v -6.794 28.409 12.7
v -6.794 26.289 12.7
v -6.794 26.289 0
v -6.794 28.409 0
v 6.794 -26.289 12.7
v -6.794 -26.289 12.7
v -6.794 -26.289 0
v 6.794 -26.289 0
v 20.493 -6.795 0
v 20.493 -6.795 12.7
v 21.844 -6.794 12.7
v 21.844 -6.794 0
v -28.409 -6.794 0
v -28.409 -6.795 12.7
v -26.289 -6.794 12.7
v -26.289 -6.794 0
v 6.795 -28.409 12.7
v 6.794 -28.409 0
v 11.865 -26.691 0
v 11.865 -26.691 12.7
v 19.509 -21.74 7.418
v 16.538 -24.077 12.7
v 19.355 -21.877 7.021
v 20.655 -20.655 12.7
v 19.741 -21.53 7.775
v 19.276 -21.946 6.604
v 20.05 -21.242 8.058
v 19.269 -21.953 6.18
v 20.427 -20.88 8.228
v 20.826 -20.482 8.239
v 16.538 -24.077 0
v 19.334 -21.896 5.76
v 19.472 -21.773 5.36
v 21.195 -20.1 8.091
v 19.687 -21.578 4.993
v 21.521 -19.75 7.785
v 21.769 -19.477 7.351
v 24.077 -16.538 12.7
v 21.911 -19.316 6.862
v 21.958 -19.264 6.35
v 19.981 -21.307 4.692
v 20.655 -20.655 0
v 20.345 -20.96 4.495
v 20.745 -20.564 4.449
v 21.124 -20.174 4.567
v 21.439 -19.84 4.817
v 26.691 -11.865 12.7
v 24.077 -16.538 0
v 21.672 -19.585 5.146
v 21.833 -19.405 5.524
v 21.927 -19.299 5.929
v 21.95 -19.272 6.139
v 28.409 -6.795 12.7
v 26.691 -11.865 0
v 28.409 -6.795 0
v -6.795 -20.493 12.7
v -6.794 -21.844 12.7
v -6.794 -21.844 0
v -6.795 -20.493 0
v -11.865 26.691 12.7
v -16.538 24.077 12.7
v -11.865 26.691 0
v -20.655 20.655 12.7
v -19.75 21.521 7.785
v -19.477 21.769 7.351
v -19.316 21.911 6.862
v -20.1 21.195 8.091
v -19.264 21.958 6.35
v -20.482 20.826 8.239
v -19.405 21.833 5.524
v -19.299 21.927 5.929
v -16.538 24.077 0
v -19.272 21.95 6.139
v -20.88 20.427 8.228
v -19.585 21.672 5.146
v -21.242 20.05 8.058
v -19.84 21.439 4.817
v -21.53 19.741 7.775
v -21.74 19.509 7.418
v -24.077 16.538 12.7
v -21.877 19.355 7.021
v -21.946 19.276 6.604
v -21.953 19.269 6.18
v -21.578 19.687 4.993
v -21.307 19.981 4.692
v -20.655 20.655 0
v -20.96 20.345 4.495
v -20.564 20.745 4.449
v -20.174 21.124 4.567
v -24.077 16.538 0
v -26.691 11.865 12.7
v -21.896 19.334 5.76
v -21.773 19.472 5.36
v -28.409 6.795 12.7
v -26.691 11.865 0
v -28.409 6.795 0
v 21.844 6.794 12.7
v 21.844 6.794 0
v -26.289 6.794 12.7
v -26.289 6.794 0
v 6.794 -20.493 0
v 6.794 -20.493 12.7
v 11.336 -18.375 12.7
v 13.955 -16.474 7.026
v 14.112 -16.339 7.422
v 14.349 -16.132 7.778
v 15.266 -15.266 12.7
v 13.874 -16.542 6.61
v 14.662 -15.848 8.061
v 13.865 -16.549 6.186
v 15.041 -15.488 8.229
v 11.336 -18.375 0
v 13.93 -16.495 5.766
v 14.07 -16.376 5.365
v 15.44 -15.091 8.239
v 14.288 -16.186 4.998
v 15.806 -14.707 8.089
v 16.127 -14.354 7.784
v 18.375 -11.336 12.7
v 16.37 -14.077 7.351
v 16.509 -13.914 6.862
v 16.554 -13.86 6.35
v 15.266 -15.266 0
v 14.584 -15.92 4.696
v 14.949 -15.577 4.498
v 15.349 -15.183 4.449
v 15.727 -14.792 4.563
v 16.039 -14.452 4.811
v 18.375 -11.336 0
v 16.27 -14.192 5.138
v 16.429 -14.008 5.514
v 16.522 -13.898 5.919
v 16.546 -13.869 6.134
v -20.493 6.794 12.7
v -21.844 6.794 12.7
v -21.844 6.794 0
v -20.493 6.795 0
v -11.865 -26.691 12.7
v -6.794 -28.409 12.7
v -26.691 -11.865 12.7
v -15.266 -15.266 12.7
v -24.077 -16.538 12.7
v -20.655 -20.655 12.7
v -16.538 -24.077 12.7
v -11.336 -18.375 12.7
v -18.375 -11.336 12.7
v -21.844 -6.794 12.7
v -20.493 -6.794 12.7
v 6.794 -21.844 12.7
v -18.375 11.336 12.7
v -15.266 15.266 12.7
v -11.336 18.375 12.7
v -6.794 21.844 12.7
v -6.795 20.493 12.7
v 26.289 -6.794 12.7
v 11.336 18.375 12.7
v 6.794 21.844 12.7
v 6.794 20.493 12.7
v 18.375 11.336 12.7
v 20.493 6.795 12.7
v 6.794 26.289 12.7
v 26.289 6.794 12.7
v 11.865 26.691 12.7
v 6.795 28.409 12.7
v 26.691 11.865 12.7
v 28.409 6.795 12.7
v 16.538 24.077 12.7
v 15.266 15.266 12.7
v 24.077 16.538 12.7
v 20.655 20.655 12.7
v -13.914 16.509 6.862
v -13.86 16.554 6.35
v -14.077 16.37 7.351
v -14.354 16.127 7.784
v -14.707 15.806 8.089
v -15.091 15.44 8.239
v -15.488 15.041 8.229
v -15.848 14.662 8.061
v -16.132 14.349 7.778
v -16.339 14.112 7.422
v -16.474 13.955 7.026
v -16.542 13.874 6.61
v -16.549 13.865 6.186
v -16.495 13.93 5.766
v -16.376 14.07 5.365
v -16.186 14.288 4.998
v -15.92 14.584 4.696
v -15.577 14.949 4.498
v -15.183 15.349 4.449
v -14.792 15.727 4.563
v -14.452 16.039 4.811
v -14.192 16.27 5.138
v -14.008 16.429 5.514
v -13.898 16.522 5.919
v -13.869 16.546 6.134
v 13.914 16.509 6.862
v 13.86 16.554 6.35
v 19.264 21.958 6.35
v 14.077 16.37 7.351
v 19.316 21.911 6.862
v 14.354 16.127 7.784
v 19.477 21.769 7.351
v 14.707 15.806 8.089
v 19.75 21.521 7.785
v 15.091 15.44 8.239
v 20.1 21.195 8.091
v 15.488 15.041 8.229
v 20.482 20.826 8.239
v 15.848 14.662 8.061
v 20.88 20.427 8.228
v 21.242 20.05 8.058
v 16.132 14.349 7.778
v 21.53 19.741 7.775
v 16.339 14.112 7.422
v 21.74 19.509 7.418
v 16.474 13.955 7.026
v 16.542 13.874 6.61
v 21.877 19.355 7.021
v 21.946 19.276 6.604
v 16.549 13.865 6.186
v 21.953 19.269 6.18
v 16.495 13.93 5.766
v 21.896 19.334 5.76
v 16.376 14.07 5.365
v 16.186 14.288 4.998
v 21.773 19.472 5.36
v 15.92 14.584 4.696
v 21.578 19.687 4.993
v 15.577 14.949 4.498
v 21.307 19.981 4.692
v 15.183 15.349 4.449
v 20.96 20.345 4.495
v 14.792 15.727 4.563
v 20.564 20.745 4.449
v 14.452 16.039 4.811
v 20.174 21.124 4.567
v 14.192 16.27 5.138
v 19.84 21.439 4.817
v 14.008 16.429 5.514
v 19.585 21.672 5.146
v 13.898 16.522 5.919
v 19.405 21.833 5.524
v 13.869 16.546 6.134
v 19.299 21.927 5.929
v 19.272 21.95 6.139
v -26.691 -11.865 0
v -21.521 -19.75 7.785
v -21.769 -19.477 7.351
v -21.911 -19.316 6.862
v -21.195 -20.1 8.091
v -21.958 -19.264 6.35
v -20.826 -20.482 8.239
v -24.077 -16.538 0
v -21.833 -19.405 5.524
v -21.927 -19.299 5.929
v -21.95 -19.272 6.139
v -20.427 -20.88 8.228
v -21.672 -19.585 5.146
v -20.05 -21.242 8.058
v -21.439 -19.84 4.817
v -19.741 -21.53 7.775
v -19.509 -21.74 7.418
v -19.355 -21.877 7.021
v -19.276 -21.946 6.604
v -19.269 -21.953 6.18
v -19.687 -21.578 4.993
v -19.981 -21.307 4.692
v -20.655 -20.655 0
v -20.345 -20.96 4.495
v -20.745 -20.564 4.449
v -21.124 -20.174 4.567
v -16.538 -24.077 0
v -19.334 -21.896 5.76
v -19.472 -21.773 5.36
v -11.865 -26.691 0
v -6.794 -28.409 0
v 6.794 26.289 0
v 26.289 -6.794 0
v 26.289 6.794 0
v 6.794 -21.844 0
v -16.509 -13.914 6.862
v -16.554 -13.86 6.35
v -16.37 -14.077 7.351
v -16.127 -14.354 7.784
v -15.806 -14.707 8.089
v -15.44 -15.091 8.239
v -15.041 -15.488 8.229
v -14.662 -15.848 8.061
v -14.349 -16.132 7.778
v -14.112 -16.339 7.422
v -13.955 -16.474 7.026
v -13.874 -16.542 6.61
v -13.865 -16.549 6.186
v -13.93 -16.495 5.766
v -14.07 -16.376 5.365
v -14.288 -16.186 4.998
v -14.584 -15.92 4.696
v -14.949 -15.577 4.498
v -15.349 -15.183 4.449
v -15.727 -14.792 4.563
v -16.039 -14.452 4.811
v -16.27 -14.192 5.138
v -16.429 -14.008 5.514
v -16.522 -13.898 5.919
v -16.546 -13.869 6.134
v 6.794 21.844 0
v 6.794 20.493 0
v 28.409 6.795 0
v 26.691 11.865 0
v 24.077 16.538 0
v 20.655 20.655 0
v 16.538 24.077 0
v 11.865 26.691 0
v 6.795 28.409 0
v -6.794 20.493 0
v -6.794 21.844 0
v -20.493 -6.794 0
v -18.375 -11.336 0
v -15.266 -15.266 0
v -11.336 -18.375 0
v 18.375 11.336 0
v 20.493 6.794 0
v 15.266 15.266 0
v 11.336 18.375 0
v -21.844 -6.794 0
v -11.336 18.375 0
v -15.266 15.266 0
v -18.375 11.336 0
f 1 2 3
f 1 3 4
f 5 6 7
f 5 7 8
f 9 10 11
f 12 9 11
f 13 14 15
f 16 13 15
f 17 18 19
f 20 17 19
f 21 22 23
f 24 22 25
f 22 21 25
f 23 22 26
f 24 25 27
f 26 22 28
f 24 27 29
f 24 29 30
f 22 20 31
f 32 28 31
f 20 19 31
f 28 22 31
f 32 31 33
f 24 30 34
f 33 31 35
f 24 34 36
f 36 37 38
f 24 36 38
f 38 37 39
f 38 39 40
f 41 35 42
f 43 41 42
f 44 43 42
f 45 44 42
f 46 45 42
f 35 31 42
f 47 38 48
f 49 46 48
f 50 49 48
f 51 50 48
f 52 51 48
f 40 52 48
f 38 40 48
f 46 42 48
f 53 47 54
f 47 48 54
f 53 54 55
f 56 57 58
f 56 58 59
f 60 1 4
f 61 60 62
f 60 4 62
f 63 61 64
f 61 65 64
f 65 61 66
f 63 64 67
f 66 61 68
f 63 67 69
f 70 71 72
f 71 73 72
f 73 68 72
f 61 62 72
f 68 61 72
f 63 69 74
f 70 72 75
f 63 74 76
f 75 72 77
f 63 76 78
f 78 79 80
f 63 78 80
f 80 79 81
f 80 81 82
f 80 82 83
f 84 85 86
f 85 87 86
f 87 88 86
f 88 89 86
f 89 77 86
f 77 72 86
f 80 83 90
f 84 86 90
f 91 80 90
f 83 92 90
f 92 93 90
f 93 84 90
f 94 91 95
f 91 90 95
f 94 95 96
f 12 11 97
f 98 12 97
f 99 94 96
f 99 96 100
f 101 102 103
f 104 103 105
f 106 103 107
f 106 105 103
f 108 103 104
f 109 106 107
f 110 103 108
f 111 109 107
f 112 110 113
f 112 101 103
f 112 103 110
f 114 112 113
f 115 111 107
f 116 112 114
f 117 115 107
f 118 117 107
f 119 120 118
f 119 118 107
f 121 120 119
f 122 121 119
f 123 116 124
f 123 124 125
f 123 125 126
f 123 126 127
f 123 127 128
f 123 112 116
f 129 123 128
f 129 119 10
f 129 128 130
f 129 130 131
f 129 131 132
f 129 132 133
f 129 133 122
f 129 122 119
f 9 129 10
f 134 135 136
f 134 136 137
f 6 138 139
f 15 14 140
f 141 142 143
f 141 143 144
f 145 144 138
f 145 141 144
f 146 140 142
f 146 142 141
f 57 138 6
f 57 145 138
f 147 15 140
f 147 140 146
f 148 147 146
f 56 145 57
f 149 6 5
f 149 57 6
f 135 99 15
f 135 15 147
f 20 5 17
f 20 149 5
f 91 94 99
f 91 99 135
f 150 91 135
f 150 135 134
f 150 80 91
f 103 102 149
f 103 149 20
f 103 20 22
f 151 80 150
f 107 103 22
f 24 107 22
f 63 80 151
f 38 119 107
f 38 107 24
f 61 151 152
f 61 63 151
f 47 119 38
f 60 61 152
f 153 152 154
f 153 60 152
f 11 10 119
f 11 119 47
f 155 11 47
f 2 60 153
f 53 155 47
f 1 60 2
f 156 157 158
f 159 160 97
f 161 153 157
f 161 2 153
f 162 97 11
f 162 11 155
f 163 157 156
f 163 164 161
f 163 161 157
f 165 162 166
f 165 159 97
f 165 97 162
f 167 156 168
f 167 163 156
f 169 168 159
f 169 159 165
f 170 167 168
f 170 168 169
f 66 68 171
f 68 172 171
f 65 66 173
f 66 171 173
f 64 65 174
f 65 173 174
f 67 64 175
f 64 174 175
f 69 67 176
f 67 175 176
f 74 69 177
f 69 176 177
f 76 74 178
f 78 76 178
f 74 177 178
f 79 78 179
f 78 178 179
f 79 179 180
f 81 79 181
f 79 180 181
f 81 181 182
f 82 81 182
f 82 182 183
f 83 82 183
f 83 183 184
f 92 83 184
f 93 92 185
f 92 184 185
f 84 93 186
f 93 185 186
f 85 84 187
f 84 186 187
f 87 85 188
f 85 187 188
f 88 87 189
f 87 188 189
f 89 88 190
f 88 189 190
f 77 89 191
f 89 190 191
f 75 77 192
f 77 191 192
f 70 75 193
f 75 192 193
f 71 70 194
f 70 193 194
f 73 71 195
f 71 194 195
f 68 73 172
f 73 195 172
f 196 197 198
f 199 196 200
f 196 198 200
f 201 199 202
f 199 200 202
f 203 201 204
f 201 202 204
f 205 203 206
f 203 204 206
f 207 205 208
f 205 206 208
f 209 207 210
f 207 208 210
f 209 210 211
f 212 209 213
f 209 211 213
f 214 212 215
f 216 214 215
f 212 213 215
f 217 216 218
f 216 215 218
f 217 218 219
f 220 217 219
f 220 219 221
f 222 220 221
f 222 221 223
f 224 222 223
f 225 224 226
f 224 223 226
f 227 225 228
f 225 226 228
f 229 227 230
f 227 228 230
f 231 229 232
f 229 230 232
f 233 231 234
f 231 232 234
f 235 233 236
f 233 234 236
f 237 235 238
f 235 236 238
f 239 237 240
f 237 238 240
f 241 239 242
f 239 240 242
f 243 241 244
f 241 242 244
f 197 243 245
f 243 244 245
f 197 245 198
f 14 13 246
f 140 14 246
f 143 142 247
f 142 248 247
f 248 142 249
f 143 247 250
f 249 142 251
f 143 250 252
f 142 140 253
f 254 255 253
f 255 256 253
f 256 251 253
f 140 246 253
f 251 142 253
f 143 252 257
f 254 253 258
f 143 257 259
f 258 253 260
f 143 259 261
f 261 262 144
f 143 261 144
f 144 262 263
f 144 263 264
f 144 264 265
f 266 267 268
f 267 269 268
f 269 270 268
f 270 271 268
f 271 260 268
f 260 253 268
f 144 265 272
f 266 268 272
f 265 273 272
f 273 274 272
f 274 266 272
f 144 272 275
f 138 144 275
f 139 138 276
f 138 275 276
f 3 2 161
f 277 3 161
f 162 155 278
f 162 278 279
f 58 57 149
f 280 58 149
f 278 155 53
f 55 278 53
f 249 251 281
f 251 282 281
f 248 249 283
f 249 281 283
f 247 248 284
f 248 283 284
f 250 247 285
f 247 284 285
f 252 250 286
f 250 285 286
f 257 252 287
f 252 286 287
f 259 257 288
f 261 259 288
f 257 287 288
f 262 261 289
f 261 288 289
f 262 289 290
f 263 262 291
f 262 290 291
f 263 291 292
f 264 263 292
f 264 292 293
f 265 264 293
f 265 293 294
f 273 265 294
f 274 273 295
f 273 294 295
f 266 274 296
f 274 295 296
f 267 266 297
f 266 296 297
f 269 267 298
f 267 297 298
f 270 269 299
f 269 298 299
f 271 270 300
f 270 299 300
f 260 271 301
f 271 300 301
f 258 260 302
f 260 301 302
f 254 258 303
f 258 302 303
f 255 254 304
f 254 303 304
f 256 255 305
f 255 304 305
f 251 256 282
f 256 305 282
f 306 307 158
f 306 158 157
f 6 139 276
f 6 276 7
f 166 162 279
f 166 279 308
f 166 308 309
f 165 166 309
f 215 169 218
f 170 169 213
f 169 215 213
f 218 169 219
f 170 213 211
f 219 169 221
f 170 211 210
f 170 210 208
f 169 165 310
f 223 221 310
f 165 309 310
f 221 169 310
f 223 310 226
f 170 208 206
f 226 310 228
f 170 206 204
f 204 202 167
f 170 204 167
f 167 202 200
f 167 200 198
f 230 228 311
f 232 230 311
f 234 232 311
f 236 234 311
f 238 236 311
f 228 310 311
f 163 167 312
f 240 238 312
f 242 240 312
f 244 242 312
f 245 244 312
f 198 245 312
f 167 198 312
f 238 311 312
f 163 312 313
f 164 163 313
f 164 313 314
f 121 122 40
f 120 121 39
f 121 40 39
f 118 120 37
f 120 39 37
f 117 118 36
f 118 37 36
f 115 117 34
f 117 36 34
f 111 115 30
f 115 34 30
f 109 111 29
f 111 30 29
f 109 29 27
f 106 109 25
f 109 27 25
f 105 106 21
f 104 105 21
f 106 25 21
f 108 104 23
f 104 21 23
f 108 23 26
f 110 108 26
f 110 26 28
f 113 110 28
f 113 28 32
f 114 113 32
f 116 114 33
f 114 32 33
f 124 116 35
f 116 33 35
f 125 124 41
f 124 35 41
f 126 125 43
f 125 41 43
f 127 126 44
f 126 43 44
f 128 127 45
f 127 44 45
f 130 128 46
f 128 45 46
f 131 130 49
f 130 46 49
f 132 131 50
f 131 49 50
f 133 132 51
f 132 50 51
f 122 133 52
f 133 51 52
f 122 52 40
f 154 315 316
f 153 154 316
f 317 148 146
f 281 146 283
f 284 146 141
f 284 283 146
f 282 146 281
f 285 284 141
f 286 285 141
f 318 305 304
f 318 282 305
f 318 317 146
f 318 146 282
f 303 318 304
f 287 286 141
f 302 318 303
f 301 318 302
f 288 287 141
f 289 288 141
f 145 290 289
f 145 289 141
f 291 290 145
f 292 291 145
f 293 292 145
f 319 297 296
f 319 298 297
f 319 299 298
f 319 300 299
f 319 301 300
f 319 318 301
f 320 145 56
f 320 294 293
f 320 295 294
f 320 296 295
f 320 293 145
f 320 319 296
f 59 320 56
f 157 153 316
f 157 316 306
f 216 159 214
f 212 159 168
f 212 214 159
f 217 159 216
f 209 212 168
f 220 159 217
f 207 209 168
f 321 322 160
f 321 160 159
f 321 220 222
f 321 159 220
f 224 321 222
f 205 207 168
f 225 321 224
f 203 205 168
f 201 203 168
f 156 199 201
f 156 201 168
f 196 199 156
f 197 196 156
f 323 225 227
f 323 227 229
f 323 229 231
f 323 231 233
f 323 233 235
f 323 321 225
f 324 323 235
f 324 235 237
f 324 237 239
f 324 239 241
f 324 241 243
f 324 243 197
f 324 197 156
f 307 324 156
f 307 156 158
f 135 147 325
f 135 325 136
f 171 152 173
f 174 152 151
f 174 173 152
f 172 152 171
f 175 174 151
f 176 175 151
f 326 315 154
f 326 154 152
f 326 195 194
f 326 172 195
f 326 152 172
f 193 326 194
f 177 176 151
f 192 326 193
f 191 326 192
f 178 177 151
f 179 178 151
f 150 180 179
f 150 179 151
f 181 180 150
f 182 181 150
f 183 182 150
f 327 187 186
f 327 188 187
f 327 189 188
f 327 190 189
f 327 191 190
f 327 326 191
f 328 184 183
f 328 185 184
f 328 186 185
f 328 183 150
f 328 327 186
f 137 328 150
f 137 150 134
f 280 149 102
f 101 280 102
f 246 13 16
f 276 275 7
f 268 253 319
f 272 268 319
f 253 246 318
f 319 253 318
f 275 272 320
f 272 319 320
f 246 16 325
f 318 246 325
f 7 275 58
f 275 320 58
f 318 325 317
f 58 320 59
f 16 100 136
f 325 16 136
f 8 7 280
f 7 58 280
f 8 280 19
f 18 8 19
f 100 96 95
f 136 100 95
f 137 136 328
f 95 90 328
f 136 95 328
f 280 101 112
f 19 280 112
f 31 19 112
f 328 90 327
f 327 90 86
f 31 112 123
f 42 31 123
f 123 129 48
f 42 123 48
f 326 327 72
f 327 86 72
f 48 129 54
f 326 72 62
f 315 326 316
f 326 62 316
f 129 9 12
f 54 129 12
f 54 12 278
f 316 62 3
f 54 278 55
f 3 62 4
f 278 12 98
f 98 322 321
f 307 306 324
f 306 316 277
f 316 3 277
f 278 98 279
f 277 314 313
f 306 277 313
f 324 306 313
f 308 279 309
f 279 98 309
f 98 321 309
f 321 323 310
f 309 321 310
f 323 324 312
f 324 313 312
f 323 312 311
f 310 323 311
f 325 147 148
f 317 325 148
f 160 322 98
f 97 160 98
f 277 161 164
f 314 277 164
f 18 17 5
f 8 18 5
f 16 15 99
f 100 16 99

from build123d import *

# Parameters (mm, degrees)
F0_R      = 29.21
F0_R_2    = 21.59
F1_DEPTH  = 12.7
F2_W      = 13.589
F2_H      = 3.556
F2_W_2    = 3.556
F2_H_2    = 13.589
F3_DEPTH  = 25.4
F7_R      = 1.905
F8_DEPTH  = 393.7
F12_R     = 1.905
F13_DEPTH = 38.1


with BuildPart() as f1:
    # F0 (on Top) → F1 (new body)
    with BuildSketch(Plane.XY):
        Circle(F0_R)
        Circle(F0_R_2, mode=Mode.SUBTRACT)
    extrude(amount=F1_DEPTH)

    # F2 (on face) → F3 (cut)
    with BuildSketch(Plane.XY.offset(12.7)):
        with Locations((0, 20.066)):
            Rectangle(F2_W, F2_H)
        with Locations((0, 28.067)):
            Rectangle(F2_W, F2_H)
        with Locations((-20.066, 0)):
            Rectangle(F2_W_2, F2_H_2)
        with Locations((-28.067, 0)):
            Rectangle(F2_W_2, F2_H_2)
        with Locations((0, -20.066)):
            Rectangle(F2_W, F2_H)
        with Locations((0, -28.067)):
            Rectangle(F2_W, F2_H)
        with Locations((20.066, 0)):
            Rectangle(F2_W_2, F2_H_2)
        with Locations((28.067, 0)):
            Rectangle(F2_W_2, F2_H_2)
    extrude(amount=-F3_DEPTH, mode=Mode.SUBTRACT)

    # F7 (on 3pt) → F8 (cut, symmetric)
    with BuildSketch(Plane(origin=(0, 0, 0), x_dir=(0.7071067812, 0.7071067812, 0), z_dir=(0.7071067812, -0.7071067812, 0))):
        with Locations((0, 6.35)):
            Circle(F7_R)
    extrude(amount=F8_DEPTH, both=True, mode=Mode.SUBTRACT)

    # F12 (on 3pt) → F13 (cut, symmetric)
    with BuildSketch(Plane(origin=(0, 0, 0), x_dir=(-0.7071067812, 0.7071067812, 0), z_dir=(0.7071067812, 0.7071067812, 0))):
        with Locations((0, 6.35)):
            Circle(F12_R)
    extrude(amount=F13_DEPTH, both=True, mode=Mode.SUBTRACT)


solid = f1.part
